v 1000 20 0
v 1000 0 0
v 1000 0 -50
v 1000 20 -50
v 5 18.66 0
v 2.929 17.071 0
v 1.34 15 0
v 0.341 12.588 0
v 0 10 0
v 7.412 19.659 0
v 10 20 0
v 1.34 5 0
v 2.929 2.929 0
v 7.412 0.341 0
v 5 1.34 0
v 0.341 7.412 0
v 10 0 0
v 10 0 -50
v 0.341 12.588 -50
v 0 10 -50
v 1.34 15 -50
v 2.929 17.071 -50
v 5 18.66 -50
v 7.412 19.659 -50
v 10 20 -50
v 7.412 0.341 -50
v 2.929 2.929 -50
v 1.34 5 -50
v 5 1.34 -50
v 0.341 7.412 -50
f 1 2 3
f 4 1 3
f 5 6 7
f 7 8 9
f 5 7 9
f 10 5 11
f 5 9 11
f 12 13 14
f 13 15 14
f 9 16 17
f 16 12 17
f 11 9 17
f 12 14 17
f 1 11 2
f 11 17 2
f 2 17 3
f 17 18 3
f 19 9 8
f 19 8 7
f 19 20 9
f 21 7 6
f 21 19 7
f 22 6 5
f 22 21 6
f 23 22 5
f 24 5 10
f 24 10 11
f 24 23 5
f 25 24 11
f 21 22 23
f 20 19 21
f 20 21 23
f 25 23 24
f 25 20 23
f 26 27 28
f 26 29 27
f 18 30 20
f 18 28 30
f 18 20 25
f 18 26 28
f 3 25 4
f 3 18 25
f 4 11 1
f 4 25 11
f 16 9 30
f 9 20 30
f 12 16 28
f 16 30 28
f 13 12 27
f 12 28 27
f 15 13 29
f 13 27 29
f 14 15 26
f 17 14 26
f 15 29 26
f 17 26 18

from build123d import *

# Parameters (mm, degrees)
SKETCH1_W           = 1000
SKETCH1_H           = 50
BOSS_EXTRUDE1_DEPTH = 20
FILLET1_R           = 10


with BuildPart() as part:
    # Sketch1 → Boss-Extrude1 (new body)
    with BuildSketch(Plane(origin=(0, 0, 0), x_dir=(1, 0, 0), z_dir=(0, 1, 0))):
        with Locations((500, 25)):
            Rectangle(SKETCH1_W, SKETCH1_H)
    extrude(amount=BOSS_EXTRUDE1_DEPTH)

    # Fillet1
    fillet1_edges = [part.edges().sort_by_distance(p)[0] for p in [
        (0, 0, -25),
        (0, 20, -25),
    ]]
    fillet(fillet1_edges, radius=FILLET1_R - 0.0001)  # a hair under: the kernel refuses the full size


solid = part.part
